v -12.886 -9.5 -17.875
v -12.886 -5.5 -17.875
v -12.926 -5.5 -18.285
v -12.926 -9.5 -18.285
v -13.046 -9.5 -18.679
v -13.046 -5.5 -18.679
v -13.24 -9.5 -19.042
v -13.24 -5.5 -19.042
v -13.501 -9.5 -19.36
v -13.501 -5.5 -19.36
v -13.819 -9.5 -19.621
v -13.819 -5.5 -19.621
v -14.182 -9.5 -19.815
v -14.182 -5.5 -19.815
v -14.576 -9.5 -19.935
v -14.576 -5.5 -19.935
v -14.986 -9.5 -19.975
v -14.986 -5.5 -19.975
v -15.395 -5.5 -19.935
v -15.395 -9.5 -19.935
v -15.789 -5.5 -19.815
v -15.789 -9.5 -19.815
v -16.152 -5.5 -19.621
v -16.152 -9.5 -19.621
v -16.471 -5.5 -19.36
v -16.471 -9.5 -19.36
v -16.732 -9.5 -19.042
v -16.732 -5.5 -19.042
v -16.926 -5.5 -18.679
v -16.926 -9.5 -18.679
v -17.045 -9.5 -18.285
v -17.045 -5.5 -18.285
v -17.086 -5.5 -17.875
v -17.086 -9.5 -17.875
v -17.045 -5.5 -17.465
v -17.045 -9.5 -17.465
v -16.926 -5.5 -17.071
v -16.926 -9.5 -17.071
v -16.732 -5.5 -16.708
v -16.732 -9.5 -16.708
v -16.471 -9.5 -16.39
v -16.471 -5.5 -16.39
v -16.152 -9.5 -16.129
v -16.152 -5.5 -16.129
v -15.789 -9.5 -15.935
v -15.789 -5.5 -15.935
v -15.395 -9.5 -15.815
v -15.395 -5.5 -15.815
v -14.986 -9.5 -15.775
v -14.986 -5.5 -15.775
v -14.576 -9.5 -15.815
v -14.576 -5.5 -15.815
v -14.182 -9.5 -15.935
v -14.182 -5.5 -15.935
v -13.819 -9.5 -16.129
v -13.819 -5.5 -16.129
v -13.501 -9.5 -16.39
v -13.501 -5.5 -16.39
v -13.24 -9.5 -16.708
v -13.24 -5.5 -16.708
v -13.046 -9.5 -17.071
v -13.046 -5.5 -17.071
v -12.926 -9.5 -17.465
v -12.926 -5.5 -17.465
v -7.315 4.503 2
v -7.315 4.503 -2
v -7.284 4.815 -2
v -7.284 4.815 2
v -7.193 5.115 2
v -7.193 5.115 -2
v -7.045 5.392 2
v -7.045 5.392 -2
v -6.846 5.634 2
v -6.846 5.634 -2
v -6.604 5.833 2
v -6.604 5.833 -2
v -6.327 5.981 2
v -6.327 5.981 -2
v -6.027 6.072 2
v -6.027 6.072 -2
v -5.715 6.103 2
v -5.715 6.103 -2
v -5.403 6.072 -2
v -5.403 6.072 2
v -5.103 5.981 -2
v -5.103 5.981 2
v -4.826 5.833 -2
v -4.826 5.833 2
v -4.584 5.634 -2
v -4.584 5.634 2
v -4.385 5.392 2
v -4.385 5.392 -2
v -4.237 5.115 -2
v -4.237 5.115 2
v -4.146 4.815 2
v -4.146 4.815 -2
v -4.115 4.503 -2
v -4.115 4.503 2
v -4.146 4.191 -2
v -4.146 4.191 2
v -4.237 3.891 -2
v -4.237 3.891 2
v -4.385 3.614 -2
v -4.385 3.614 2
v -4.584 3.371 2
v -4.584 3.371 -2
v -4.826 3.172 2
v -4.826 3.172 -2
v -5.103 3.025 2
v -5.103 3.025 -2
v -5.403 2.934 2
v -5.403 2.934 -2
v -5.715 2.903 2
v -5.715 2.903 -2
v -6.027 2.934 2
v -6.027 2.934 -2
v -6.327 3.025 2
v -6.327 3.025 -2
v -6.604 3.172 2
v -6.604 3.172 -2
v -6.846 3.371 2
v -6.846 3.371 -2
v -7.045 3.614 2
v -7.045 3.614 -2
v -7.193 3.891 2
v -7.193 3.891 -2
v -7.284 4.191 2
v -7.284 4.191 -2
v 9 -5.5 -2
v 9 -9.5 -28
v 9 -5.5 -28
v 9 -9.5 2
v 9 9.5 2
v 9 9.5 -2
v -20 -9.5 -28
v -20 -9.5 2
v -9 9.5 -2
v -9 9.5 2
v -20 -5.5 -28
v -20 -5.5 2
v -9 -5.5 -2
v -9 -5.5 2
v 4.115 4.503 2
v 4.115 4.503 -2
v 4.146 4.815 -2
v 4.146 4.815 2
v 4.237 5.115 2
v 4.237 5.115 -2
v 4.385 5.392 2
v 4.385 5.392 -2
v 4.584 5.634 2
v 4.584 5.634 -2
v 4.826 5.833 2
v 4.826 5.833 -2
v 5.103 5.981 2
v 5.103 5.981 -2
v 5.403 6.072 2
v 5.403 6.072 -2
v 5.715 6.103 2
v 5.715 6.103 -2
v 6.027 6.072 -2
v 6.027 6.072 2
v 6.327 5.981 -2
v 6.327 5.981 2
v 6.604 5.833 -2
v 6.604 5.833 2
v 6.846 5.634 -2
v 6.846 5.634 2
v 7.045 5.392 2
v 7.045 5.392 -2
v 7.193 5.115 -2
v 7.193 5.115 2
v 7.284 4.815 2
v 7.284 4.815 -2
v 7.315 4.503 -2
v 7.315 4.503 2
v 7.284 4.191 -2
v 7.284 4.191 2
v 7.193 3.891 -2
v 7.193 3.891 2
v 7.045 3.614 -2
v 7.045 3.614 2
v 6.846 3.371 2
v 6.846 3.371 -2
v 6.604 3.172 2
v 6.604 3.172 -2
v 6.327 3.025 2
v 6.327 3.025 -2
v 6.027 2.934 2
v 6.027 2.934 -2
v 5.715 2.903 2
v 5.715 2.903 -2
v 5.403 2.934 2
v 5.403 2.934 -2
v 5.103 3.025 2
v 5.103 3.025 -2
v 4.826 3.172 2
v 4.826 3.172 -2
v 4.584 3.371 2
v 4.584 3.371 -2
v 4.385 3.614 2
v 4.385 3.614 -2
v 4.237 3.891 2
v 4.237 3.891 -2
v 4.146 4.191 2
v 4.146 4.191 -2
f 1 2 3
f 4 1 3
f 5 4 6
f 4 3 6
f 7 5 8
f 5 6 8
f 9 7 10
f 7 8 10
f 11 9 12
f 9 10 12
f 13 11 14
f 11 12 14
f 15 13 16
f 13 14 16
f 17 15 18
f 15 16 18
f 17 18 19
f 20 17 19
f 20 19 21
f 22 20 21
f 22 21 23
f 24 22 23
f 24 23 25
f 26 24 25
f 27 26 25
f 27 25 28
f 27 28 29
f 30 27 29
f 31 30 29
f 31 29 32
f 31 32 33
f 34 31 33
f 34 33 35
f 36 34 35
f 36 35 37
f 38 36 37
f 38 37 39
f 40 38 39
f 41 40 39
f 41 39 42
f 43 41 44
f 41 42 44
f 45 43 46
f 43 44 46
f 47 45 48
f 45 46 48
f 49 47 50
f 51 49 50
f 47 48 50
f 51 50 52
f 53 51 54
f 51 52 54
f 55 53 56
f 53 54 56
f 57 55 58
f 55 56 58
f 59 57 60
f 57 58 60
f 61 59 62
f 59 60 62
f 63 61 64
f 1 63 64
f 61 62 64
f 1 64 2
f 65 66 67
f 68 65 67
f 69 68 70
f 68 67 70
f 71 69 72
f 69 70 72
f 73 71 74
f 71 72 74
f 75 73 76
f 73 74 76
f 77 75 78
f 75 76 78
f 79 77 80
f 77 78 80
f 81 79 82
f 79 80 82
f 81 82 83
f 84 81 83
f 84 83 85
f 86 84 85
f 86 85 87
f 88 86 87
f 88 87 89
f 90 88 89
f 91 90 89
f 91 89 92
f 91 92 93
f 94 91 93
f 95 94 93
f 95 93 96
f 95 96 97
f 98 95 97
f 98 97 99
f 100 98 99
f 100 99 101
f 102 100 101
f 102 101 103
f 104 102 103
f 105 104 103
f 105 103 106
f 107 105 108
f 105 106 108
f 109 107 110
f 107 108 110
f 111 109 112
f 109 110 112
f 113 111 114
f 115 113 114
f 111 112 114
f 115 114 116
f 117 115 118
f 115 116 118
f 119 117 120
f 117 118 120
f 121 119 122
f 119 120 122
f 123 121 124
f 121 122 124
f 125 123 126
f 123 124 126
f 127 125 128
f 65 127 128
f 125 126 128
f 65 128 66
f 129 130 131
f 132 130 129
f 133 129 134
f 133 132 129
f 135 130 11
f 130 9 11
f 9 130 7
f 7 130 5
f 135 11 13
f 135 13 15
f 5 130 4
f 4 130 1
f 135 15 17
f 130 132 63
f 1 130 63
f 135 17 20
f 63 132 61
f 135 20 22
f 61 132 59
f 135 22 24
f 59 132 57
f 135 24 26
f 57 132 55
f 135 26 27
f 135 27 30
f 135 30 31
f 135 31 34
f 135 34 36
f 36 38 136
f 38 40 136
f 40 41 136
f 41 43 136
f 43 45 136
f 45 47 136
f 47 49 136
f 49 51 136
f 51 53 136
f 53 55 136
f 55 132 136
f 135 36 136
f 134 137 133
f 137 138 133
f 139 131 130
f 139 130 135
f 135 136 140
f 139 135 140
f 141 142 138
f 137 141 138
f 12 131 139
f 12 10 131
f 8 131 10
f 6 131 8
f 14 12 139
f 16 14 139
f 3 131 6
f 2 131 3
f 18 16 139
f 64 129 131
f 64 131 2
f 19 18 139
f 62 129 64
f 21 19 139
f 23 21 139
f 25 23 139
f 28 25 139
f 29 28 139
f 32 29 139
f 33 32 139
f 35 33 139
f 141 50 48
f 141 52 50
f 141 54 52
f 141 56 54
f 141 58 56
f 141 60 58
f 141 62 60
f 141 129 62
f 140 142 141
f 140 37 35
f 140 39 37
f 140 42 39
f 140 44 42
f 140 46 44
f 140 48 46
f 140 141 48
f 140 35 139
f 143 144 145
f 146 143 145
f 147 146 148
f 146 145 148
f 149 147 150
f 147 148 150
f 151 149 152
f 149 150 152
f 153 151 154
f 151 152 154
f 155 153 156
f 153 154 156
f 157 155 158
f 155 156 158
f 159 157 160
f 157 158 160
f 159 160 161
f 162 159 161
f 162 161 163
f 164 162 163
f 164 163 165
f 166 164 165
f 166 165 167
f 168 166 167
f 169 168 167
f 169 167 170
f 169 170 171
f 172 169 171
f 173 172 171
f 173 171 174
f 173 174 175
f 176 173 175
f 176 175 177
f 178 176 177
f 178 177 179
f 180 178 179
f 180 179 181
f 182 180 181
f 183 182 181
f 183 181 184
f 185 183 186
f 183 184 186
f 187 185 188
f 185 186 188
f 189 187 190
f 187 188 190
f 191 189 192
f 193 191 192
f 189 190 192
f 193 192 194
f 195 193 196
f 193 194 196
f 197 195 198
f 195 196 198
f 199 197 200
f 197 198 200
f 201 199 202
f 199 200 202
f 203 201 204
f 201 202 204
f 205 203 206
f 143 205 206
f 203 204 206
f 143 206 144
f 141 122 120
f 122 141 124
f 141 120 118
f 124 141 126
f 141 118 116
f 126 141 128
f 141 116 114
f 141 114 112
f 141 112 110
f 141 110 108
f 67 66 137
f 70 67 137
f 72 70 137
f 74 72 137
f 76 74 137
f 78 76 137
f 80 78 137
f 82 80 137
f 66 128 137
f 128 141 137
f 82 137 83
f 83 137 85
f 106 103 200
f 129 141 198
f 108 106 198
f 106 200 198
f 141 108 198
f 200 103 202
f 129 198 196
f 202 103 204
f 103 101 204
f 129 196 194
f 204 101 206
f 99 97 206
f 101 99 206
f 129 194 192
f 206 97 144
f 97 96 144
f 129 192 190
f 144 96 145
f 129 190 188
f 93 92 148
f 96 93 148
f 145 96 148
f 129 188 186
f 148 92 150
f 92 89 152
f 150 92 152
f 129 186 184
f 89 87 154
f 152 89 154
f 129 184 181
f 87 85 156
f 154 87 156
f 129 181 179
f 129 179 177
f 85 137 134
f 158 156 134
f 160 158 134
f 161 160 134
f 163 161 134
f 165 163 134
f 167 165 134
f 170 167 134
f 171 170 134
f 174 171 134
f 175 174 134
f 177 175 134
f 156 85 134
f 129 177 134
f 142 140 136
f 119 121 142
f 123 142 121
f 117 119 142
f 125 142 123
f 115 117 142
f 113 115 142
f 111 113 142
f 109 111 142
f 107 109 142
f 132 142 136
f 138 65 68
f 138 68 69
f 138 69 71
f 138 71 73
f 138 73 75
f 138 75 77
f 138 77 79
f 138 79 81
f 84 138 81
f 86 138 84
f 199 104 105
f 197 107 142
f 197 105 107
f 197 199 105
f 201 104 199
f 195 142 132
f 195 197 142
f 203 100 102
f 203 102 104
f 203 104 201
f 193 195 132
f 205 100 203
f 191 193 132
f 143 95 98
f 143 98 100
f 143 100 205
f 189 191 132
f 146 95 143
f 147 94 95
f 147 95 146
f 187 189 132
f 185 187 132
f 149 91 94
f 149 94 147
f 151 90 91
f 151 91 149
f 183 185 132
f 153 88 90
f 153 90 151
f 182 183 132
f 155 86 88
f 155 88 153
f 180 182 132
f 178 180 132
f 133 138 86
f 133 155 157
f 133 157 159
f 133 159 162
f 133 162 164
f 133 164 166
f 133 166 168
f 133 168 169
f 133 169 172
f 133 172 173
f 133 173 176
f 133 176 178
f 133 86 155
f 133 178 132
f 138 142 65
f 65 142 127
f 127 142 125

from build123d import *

# Parameters (mm, degrees)
SKETCH1_W                          = 18
SKETCH1_H                          = 19
BOSS_EXTRUDE1_DEPTH                = 2
SKETCH2_W                          = 29
SKETCH2_H                          = 4
BOSS_EXTRUDE2_DEPTH                = 30
M3_CLEARANCE_HOLE1_D               = 3.2
TAPPED_HOLE_FOR_M4X0_7_HELICOIL1_D = 4.2


with BuildPart() as part:
    # Sketch1 → Boss-Extrude1 (new, symmetric)
    with BuildSketch(Plane.XY):
        Rectangle(SKETCH1_W, SKETCH1_H)
    extrude(amount=BOSS_EXTRUDE1_DEPTH, both=True)

    # Sketch2 → Boss-Extrude2 (add)
    with BuildSketch(Plane(origin=(0, 0, 2), x_dir=(-1, 0, 0), z_dir=(0, 0, -1))):
        with Locations((5.5, -7.5)):
            Rectangle(SKETCH2_W, SKETCH2_H)
    extrude(amount=BOSS_EXTRUDE2_DEPTH)

    # M3 Clearance Hole1 (through all)
    with Locations(Plane.XY.offset(2)):
        with Locations((-5.715, 4.5028), (5.715, 4.5028)):
            Hole(M3_CLEARANCE_HOLE1_D / 2)

    # Tapped Hole for M4x0.7 Helicoil1 (through all)
    with Locations(Plane(origin=(0, -9.5, 0), x_dir=(-1, 0, 0), z_dir=(0, -1, 0))):
        with Locations((14.9858, 17.875)):
            Hole(TAPPED_HOLE_FOR_M4X0_7_HELICOIL1_D / 2)


solid = part.part
